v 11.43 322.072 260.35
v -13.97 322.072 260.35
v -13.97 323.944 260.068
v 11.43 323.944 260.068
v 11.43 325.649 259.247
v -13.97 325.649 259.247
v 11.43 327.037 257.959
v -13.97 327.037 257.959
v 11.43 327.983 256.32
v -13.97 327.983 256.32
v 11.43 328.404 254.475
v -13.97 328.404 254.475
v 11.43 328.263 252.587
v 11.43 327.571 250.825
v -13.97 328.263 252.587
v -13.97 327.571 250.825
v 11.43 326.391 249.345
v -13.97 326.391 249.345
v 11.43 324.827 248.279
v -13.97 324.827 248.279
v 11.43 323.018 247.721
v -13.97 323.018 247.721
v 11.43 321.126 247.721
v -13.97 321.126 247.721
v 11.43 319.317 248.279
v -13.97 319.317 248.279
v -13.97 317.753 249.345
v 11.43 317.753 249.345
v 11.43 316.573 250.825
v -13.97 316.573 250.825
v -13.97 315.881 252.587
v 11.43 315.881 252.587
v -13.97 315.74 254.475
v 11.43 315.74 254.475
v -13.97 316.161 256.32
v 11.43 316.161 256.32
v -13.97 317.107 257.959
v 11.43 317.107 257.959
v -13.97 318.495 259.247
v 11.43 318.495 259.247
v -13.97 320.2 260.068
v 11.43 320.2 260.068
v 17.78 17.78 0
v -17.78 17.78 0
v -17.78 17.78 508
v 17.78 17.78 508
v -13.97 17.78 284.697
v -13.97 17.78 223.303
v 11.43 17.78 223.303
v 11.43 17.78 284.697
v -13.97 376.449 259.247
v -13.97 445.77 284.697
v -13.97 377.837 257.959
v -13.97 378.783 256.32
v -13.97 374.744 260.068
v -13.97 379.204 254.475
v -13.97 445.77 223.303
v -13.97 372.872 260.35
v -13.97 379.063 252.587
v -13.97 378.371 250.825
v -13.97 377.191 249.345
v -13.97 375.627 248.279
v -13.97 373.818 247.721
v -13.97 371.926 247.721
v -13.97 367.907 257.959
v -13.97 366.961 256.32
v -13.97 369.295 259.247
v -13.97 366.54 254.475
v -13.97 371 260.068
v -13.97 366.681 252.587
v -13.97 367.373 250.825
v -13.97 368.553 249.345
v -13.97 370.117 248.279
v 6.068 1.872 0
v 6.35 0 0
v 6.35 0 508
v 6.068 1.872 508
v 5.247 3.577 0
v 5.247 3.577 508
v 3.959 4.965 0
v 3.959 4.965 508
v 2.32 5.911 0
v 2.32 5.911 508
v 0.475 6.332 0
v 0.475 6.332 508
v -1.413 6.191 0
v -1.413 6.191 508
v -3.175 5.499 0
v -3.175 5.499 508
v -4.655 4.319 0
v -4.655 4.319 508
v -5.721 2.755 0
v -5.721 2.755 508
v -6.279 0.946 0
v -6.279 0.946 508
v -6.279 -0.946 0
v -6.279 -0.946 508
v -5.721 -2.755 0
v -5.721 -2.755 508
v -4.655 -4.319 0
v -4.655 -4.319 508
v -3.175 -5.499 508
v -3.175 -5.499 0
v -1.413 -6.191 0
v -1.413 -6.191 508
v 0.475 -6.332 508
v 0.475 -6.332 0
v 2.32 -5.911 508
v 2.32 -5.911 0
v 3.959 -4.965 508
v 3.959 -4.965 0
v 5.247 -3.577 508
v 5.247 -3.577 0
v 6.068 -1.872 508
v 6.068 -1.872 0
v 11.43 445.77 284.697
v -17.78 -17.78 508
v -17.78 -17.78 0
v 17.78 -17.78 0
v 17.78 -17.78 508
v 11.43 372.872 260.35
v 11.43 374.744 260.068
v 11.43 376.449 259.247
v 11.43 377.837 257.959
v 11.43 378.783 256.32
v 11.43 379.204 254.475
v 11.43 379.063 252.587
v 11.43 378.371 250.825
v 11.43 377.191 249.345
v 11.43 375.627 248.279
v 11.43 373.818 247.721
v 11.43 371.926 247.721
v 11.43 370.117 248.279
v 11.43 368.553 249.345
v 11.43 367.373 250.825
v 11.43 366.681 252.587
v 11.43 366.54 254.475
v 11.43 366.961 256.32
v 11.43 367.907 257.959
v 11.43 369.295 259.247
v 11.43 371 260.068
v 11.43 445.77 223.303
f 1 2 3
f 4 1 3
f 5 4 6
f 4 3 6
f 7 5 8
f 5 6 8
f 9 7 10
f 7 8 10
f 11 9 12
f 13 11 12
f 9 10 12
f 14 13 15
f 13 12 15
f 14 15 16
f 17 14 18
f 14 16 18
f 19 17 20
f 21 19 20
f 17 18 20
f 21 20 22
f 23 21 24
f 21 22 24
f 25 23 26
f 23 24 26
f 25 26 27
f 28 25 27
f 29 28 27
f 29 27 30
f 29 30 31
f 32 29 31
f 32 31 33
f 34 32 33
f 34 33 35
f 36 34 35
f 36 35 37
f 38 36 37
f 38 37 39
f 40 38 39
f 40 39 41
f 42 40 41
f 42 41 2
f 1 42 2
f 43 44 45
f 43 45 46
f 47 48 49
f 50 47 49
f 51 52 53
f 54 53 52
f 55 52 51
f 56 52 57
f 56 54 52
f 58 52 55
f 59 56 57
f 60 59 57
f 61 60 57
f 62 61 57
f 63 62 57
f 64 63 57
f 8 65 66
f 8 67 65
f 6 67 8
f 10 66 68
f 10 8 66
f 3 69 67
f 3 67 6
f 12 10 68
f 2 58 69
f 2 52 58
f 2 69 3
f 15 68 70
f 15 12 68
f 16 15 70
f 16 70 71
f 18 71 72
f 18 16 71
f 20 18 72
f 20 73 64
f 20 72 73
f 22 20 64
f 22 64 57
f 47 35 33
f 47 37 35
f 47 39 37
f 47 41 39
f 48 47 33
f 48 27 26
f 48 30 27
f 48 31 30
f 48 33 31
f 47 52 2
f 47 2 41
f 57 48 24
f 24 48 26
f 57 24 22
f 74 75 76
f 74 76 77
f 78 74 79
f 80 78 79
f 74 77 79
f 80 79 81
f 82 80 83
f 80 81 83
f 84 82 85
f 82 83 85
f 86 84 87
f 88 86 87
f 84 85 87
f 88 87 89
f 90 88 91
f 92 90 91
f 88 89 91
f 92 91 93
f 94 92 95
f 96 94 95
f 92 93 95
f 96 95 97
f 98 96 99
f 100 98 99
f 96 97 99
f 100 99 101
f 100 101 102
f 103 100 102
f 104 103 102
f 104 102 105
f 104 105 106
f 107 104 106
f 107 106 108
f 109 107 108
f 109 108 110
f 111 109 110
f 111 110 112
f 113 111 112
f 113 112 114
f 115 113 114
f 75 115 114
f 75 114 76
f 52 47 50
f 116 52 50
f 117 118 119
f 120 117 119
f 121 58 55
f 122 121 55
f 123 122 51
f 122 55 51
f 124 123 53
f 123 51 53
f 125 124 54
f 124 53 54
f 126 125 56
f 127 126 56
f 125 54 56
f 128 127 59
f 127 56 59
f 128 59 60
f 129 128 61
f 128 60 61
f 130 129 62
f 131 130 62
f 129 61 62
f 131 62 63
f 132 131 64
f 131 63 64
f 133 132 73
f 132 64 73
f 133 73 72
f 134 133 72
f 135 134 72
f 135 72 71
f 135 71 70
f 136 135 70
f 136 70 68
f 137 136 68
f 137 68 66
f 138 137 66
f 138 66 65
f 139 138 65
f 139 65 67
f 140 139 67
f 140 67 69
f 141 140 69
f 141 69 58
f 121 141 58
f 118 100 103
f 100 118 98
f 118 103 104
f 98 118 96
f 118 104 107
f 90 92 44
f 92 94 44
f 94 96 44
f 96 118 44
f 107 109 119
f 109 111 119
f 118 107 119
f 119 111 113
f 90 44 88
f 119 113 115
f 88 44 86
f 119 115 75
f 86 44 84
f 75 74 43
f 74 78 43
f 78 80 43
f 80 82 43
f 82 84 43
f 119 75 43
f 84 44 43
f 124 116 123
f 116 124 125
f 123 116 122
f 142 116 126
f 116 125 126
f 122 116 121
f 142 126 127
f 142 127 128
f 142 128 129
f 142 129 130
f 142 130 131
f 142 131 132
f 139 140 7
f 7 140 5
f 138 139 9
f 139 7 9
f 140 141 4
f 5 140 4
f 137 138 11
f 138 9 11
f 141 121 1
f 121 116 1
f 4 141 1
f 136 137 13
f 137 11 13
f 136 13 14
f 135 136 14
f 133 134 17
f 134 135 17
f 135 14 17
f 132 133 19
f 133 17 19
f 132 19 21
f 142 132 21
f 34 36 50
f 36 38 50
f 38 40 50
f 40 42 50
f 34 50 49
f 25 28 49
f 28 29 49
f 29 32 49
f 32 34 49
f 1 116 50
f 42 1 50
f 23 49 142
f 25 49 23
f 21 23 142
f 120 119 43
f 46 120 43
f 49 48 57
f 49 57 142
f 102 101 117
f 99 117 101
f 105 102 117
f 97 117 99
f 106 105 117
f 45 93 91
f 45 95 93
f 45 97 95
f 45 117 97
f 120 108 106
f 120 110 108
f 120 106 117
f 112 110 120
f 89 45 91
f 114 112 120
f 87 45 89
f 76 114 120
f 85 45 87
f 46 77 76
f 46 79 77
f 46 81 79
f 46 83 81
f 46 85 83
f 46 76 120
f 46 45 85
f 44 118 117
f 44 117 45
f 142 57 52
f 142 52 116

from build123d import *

# Parameters (mm, degrees)
SKETCH1_W           = 35.56
SKETCH1_H           = 35.56
BOSS_EXTRUDE1_DEPTH = 508
SKETCH2_R           = 6.35
CUT_EXTRUDE1_DEPTH  = 509.621919307
SKETCH3_W           = 25.4
SKETCH3_H           = 61.394695038
BOSS_EXTRUDE2_DEPTH = 427.99
SKETCH4_R           = 6.35
CUT_EXTRUDE2_DEPTH  = 677.596597242


with BuildPart() as part:
    # Sketch1 → Boss-Extrude1 (new body)
    with BuildSketch(Plane.XY):
        Rectangle(SKETCH1_W, SKETCH1_H)
    extrude(amount=BOSS_EXTRUDE1_DEPTH)

    # Sketch2 → Cut-Extrude1 (cut, through all)
    with BuildSketch(Plane.XY.offset(508)):
        Circle(SKETCH2_R)
    extrude(amount=-CUT_EXTRUDE1_DEPTH, mode=Mode.SUBTRACT)


with BuildPart() as body_2:
    # Sketch3 → Boss-Extrude2 (new body)
    with BuildSketch(Plane(origin=(0, 17.78, 0), x_dir=(1, 0, 0), z_dir=(0, 1, 0))):
        with Locations((-1.27, -254)):
            Rectangle(SKETCH3_W, SKETCH3_H)
    extrude(amount=BOSS_EXTRUDE2_DEPTH)

    # Sketch4 → Cut-Extrude2 (cut, through all)
    with BuildSketch(Plane.ZY.offset(13.97)):
        with Locations((254, 372.872)):
            Circle(SKETCH4_R)
        with Locations((254, 322.072)):
            Circle(SKETCH4_R)
    extrude(amount=-CUT_EXTRUDE2_DEPTH, mode=Mode.SUBTRACT)


solid = Compound([part.part, body_2.part])
